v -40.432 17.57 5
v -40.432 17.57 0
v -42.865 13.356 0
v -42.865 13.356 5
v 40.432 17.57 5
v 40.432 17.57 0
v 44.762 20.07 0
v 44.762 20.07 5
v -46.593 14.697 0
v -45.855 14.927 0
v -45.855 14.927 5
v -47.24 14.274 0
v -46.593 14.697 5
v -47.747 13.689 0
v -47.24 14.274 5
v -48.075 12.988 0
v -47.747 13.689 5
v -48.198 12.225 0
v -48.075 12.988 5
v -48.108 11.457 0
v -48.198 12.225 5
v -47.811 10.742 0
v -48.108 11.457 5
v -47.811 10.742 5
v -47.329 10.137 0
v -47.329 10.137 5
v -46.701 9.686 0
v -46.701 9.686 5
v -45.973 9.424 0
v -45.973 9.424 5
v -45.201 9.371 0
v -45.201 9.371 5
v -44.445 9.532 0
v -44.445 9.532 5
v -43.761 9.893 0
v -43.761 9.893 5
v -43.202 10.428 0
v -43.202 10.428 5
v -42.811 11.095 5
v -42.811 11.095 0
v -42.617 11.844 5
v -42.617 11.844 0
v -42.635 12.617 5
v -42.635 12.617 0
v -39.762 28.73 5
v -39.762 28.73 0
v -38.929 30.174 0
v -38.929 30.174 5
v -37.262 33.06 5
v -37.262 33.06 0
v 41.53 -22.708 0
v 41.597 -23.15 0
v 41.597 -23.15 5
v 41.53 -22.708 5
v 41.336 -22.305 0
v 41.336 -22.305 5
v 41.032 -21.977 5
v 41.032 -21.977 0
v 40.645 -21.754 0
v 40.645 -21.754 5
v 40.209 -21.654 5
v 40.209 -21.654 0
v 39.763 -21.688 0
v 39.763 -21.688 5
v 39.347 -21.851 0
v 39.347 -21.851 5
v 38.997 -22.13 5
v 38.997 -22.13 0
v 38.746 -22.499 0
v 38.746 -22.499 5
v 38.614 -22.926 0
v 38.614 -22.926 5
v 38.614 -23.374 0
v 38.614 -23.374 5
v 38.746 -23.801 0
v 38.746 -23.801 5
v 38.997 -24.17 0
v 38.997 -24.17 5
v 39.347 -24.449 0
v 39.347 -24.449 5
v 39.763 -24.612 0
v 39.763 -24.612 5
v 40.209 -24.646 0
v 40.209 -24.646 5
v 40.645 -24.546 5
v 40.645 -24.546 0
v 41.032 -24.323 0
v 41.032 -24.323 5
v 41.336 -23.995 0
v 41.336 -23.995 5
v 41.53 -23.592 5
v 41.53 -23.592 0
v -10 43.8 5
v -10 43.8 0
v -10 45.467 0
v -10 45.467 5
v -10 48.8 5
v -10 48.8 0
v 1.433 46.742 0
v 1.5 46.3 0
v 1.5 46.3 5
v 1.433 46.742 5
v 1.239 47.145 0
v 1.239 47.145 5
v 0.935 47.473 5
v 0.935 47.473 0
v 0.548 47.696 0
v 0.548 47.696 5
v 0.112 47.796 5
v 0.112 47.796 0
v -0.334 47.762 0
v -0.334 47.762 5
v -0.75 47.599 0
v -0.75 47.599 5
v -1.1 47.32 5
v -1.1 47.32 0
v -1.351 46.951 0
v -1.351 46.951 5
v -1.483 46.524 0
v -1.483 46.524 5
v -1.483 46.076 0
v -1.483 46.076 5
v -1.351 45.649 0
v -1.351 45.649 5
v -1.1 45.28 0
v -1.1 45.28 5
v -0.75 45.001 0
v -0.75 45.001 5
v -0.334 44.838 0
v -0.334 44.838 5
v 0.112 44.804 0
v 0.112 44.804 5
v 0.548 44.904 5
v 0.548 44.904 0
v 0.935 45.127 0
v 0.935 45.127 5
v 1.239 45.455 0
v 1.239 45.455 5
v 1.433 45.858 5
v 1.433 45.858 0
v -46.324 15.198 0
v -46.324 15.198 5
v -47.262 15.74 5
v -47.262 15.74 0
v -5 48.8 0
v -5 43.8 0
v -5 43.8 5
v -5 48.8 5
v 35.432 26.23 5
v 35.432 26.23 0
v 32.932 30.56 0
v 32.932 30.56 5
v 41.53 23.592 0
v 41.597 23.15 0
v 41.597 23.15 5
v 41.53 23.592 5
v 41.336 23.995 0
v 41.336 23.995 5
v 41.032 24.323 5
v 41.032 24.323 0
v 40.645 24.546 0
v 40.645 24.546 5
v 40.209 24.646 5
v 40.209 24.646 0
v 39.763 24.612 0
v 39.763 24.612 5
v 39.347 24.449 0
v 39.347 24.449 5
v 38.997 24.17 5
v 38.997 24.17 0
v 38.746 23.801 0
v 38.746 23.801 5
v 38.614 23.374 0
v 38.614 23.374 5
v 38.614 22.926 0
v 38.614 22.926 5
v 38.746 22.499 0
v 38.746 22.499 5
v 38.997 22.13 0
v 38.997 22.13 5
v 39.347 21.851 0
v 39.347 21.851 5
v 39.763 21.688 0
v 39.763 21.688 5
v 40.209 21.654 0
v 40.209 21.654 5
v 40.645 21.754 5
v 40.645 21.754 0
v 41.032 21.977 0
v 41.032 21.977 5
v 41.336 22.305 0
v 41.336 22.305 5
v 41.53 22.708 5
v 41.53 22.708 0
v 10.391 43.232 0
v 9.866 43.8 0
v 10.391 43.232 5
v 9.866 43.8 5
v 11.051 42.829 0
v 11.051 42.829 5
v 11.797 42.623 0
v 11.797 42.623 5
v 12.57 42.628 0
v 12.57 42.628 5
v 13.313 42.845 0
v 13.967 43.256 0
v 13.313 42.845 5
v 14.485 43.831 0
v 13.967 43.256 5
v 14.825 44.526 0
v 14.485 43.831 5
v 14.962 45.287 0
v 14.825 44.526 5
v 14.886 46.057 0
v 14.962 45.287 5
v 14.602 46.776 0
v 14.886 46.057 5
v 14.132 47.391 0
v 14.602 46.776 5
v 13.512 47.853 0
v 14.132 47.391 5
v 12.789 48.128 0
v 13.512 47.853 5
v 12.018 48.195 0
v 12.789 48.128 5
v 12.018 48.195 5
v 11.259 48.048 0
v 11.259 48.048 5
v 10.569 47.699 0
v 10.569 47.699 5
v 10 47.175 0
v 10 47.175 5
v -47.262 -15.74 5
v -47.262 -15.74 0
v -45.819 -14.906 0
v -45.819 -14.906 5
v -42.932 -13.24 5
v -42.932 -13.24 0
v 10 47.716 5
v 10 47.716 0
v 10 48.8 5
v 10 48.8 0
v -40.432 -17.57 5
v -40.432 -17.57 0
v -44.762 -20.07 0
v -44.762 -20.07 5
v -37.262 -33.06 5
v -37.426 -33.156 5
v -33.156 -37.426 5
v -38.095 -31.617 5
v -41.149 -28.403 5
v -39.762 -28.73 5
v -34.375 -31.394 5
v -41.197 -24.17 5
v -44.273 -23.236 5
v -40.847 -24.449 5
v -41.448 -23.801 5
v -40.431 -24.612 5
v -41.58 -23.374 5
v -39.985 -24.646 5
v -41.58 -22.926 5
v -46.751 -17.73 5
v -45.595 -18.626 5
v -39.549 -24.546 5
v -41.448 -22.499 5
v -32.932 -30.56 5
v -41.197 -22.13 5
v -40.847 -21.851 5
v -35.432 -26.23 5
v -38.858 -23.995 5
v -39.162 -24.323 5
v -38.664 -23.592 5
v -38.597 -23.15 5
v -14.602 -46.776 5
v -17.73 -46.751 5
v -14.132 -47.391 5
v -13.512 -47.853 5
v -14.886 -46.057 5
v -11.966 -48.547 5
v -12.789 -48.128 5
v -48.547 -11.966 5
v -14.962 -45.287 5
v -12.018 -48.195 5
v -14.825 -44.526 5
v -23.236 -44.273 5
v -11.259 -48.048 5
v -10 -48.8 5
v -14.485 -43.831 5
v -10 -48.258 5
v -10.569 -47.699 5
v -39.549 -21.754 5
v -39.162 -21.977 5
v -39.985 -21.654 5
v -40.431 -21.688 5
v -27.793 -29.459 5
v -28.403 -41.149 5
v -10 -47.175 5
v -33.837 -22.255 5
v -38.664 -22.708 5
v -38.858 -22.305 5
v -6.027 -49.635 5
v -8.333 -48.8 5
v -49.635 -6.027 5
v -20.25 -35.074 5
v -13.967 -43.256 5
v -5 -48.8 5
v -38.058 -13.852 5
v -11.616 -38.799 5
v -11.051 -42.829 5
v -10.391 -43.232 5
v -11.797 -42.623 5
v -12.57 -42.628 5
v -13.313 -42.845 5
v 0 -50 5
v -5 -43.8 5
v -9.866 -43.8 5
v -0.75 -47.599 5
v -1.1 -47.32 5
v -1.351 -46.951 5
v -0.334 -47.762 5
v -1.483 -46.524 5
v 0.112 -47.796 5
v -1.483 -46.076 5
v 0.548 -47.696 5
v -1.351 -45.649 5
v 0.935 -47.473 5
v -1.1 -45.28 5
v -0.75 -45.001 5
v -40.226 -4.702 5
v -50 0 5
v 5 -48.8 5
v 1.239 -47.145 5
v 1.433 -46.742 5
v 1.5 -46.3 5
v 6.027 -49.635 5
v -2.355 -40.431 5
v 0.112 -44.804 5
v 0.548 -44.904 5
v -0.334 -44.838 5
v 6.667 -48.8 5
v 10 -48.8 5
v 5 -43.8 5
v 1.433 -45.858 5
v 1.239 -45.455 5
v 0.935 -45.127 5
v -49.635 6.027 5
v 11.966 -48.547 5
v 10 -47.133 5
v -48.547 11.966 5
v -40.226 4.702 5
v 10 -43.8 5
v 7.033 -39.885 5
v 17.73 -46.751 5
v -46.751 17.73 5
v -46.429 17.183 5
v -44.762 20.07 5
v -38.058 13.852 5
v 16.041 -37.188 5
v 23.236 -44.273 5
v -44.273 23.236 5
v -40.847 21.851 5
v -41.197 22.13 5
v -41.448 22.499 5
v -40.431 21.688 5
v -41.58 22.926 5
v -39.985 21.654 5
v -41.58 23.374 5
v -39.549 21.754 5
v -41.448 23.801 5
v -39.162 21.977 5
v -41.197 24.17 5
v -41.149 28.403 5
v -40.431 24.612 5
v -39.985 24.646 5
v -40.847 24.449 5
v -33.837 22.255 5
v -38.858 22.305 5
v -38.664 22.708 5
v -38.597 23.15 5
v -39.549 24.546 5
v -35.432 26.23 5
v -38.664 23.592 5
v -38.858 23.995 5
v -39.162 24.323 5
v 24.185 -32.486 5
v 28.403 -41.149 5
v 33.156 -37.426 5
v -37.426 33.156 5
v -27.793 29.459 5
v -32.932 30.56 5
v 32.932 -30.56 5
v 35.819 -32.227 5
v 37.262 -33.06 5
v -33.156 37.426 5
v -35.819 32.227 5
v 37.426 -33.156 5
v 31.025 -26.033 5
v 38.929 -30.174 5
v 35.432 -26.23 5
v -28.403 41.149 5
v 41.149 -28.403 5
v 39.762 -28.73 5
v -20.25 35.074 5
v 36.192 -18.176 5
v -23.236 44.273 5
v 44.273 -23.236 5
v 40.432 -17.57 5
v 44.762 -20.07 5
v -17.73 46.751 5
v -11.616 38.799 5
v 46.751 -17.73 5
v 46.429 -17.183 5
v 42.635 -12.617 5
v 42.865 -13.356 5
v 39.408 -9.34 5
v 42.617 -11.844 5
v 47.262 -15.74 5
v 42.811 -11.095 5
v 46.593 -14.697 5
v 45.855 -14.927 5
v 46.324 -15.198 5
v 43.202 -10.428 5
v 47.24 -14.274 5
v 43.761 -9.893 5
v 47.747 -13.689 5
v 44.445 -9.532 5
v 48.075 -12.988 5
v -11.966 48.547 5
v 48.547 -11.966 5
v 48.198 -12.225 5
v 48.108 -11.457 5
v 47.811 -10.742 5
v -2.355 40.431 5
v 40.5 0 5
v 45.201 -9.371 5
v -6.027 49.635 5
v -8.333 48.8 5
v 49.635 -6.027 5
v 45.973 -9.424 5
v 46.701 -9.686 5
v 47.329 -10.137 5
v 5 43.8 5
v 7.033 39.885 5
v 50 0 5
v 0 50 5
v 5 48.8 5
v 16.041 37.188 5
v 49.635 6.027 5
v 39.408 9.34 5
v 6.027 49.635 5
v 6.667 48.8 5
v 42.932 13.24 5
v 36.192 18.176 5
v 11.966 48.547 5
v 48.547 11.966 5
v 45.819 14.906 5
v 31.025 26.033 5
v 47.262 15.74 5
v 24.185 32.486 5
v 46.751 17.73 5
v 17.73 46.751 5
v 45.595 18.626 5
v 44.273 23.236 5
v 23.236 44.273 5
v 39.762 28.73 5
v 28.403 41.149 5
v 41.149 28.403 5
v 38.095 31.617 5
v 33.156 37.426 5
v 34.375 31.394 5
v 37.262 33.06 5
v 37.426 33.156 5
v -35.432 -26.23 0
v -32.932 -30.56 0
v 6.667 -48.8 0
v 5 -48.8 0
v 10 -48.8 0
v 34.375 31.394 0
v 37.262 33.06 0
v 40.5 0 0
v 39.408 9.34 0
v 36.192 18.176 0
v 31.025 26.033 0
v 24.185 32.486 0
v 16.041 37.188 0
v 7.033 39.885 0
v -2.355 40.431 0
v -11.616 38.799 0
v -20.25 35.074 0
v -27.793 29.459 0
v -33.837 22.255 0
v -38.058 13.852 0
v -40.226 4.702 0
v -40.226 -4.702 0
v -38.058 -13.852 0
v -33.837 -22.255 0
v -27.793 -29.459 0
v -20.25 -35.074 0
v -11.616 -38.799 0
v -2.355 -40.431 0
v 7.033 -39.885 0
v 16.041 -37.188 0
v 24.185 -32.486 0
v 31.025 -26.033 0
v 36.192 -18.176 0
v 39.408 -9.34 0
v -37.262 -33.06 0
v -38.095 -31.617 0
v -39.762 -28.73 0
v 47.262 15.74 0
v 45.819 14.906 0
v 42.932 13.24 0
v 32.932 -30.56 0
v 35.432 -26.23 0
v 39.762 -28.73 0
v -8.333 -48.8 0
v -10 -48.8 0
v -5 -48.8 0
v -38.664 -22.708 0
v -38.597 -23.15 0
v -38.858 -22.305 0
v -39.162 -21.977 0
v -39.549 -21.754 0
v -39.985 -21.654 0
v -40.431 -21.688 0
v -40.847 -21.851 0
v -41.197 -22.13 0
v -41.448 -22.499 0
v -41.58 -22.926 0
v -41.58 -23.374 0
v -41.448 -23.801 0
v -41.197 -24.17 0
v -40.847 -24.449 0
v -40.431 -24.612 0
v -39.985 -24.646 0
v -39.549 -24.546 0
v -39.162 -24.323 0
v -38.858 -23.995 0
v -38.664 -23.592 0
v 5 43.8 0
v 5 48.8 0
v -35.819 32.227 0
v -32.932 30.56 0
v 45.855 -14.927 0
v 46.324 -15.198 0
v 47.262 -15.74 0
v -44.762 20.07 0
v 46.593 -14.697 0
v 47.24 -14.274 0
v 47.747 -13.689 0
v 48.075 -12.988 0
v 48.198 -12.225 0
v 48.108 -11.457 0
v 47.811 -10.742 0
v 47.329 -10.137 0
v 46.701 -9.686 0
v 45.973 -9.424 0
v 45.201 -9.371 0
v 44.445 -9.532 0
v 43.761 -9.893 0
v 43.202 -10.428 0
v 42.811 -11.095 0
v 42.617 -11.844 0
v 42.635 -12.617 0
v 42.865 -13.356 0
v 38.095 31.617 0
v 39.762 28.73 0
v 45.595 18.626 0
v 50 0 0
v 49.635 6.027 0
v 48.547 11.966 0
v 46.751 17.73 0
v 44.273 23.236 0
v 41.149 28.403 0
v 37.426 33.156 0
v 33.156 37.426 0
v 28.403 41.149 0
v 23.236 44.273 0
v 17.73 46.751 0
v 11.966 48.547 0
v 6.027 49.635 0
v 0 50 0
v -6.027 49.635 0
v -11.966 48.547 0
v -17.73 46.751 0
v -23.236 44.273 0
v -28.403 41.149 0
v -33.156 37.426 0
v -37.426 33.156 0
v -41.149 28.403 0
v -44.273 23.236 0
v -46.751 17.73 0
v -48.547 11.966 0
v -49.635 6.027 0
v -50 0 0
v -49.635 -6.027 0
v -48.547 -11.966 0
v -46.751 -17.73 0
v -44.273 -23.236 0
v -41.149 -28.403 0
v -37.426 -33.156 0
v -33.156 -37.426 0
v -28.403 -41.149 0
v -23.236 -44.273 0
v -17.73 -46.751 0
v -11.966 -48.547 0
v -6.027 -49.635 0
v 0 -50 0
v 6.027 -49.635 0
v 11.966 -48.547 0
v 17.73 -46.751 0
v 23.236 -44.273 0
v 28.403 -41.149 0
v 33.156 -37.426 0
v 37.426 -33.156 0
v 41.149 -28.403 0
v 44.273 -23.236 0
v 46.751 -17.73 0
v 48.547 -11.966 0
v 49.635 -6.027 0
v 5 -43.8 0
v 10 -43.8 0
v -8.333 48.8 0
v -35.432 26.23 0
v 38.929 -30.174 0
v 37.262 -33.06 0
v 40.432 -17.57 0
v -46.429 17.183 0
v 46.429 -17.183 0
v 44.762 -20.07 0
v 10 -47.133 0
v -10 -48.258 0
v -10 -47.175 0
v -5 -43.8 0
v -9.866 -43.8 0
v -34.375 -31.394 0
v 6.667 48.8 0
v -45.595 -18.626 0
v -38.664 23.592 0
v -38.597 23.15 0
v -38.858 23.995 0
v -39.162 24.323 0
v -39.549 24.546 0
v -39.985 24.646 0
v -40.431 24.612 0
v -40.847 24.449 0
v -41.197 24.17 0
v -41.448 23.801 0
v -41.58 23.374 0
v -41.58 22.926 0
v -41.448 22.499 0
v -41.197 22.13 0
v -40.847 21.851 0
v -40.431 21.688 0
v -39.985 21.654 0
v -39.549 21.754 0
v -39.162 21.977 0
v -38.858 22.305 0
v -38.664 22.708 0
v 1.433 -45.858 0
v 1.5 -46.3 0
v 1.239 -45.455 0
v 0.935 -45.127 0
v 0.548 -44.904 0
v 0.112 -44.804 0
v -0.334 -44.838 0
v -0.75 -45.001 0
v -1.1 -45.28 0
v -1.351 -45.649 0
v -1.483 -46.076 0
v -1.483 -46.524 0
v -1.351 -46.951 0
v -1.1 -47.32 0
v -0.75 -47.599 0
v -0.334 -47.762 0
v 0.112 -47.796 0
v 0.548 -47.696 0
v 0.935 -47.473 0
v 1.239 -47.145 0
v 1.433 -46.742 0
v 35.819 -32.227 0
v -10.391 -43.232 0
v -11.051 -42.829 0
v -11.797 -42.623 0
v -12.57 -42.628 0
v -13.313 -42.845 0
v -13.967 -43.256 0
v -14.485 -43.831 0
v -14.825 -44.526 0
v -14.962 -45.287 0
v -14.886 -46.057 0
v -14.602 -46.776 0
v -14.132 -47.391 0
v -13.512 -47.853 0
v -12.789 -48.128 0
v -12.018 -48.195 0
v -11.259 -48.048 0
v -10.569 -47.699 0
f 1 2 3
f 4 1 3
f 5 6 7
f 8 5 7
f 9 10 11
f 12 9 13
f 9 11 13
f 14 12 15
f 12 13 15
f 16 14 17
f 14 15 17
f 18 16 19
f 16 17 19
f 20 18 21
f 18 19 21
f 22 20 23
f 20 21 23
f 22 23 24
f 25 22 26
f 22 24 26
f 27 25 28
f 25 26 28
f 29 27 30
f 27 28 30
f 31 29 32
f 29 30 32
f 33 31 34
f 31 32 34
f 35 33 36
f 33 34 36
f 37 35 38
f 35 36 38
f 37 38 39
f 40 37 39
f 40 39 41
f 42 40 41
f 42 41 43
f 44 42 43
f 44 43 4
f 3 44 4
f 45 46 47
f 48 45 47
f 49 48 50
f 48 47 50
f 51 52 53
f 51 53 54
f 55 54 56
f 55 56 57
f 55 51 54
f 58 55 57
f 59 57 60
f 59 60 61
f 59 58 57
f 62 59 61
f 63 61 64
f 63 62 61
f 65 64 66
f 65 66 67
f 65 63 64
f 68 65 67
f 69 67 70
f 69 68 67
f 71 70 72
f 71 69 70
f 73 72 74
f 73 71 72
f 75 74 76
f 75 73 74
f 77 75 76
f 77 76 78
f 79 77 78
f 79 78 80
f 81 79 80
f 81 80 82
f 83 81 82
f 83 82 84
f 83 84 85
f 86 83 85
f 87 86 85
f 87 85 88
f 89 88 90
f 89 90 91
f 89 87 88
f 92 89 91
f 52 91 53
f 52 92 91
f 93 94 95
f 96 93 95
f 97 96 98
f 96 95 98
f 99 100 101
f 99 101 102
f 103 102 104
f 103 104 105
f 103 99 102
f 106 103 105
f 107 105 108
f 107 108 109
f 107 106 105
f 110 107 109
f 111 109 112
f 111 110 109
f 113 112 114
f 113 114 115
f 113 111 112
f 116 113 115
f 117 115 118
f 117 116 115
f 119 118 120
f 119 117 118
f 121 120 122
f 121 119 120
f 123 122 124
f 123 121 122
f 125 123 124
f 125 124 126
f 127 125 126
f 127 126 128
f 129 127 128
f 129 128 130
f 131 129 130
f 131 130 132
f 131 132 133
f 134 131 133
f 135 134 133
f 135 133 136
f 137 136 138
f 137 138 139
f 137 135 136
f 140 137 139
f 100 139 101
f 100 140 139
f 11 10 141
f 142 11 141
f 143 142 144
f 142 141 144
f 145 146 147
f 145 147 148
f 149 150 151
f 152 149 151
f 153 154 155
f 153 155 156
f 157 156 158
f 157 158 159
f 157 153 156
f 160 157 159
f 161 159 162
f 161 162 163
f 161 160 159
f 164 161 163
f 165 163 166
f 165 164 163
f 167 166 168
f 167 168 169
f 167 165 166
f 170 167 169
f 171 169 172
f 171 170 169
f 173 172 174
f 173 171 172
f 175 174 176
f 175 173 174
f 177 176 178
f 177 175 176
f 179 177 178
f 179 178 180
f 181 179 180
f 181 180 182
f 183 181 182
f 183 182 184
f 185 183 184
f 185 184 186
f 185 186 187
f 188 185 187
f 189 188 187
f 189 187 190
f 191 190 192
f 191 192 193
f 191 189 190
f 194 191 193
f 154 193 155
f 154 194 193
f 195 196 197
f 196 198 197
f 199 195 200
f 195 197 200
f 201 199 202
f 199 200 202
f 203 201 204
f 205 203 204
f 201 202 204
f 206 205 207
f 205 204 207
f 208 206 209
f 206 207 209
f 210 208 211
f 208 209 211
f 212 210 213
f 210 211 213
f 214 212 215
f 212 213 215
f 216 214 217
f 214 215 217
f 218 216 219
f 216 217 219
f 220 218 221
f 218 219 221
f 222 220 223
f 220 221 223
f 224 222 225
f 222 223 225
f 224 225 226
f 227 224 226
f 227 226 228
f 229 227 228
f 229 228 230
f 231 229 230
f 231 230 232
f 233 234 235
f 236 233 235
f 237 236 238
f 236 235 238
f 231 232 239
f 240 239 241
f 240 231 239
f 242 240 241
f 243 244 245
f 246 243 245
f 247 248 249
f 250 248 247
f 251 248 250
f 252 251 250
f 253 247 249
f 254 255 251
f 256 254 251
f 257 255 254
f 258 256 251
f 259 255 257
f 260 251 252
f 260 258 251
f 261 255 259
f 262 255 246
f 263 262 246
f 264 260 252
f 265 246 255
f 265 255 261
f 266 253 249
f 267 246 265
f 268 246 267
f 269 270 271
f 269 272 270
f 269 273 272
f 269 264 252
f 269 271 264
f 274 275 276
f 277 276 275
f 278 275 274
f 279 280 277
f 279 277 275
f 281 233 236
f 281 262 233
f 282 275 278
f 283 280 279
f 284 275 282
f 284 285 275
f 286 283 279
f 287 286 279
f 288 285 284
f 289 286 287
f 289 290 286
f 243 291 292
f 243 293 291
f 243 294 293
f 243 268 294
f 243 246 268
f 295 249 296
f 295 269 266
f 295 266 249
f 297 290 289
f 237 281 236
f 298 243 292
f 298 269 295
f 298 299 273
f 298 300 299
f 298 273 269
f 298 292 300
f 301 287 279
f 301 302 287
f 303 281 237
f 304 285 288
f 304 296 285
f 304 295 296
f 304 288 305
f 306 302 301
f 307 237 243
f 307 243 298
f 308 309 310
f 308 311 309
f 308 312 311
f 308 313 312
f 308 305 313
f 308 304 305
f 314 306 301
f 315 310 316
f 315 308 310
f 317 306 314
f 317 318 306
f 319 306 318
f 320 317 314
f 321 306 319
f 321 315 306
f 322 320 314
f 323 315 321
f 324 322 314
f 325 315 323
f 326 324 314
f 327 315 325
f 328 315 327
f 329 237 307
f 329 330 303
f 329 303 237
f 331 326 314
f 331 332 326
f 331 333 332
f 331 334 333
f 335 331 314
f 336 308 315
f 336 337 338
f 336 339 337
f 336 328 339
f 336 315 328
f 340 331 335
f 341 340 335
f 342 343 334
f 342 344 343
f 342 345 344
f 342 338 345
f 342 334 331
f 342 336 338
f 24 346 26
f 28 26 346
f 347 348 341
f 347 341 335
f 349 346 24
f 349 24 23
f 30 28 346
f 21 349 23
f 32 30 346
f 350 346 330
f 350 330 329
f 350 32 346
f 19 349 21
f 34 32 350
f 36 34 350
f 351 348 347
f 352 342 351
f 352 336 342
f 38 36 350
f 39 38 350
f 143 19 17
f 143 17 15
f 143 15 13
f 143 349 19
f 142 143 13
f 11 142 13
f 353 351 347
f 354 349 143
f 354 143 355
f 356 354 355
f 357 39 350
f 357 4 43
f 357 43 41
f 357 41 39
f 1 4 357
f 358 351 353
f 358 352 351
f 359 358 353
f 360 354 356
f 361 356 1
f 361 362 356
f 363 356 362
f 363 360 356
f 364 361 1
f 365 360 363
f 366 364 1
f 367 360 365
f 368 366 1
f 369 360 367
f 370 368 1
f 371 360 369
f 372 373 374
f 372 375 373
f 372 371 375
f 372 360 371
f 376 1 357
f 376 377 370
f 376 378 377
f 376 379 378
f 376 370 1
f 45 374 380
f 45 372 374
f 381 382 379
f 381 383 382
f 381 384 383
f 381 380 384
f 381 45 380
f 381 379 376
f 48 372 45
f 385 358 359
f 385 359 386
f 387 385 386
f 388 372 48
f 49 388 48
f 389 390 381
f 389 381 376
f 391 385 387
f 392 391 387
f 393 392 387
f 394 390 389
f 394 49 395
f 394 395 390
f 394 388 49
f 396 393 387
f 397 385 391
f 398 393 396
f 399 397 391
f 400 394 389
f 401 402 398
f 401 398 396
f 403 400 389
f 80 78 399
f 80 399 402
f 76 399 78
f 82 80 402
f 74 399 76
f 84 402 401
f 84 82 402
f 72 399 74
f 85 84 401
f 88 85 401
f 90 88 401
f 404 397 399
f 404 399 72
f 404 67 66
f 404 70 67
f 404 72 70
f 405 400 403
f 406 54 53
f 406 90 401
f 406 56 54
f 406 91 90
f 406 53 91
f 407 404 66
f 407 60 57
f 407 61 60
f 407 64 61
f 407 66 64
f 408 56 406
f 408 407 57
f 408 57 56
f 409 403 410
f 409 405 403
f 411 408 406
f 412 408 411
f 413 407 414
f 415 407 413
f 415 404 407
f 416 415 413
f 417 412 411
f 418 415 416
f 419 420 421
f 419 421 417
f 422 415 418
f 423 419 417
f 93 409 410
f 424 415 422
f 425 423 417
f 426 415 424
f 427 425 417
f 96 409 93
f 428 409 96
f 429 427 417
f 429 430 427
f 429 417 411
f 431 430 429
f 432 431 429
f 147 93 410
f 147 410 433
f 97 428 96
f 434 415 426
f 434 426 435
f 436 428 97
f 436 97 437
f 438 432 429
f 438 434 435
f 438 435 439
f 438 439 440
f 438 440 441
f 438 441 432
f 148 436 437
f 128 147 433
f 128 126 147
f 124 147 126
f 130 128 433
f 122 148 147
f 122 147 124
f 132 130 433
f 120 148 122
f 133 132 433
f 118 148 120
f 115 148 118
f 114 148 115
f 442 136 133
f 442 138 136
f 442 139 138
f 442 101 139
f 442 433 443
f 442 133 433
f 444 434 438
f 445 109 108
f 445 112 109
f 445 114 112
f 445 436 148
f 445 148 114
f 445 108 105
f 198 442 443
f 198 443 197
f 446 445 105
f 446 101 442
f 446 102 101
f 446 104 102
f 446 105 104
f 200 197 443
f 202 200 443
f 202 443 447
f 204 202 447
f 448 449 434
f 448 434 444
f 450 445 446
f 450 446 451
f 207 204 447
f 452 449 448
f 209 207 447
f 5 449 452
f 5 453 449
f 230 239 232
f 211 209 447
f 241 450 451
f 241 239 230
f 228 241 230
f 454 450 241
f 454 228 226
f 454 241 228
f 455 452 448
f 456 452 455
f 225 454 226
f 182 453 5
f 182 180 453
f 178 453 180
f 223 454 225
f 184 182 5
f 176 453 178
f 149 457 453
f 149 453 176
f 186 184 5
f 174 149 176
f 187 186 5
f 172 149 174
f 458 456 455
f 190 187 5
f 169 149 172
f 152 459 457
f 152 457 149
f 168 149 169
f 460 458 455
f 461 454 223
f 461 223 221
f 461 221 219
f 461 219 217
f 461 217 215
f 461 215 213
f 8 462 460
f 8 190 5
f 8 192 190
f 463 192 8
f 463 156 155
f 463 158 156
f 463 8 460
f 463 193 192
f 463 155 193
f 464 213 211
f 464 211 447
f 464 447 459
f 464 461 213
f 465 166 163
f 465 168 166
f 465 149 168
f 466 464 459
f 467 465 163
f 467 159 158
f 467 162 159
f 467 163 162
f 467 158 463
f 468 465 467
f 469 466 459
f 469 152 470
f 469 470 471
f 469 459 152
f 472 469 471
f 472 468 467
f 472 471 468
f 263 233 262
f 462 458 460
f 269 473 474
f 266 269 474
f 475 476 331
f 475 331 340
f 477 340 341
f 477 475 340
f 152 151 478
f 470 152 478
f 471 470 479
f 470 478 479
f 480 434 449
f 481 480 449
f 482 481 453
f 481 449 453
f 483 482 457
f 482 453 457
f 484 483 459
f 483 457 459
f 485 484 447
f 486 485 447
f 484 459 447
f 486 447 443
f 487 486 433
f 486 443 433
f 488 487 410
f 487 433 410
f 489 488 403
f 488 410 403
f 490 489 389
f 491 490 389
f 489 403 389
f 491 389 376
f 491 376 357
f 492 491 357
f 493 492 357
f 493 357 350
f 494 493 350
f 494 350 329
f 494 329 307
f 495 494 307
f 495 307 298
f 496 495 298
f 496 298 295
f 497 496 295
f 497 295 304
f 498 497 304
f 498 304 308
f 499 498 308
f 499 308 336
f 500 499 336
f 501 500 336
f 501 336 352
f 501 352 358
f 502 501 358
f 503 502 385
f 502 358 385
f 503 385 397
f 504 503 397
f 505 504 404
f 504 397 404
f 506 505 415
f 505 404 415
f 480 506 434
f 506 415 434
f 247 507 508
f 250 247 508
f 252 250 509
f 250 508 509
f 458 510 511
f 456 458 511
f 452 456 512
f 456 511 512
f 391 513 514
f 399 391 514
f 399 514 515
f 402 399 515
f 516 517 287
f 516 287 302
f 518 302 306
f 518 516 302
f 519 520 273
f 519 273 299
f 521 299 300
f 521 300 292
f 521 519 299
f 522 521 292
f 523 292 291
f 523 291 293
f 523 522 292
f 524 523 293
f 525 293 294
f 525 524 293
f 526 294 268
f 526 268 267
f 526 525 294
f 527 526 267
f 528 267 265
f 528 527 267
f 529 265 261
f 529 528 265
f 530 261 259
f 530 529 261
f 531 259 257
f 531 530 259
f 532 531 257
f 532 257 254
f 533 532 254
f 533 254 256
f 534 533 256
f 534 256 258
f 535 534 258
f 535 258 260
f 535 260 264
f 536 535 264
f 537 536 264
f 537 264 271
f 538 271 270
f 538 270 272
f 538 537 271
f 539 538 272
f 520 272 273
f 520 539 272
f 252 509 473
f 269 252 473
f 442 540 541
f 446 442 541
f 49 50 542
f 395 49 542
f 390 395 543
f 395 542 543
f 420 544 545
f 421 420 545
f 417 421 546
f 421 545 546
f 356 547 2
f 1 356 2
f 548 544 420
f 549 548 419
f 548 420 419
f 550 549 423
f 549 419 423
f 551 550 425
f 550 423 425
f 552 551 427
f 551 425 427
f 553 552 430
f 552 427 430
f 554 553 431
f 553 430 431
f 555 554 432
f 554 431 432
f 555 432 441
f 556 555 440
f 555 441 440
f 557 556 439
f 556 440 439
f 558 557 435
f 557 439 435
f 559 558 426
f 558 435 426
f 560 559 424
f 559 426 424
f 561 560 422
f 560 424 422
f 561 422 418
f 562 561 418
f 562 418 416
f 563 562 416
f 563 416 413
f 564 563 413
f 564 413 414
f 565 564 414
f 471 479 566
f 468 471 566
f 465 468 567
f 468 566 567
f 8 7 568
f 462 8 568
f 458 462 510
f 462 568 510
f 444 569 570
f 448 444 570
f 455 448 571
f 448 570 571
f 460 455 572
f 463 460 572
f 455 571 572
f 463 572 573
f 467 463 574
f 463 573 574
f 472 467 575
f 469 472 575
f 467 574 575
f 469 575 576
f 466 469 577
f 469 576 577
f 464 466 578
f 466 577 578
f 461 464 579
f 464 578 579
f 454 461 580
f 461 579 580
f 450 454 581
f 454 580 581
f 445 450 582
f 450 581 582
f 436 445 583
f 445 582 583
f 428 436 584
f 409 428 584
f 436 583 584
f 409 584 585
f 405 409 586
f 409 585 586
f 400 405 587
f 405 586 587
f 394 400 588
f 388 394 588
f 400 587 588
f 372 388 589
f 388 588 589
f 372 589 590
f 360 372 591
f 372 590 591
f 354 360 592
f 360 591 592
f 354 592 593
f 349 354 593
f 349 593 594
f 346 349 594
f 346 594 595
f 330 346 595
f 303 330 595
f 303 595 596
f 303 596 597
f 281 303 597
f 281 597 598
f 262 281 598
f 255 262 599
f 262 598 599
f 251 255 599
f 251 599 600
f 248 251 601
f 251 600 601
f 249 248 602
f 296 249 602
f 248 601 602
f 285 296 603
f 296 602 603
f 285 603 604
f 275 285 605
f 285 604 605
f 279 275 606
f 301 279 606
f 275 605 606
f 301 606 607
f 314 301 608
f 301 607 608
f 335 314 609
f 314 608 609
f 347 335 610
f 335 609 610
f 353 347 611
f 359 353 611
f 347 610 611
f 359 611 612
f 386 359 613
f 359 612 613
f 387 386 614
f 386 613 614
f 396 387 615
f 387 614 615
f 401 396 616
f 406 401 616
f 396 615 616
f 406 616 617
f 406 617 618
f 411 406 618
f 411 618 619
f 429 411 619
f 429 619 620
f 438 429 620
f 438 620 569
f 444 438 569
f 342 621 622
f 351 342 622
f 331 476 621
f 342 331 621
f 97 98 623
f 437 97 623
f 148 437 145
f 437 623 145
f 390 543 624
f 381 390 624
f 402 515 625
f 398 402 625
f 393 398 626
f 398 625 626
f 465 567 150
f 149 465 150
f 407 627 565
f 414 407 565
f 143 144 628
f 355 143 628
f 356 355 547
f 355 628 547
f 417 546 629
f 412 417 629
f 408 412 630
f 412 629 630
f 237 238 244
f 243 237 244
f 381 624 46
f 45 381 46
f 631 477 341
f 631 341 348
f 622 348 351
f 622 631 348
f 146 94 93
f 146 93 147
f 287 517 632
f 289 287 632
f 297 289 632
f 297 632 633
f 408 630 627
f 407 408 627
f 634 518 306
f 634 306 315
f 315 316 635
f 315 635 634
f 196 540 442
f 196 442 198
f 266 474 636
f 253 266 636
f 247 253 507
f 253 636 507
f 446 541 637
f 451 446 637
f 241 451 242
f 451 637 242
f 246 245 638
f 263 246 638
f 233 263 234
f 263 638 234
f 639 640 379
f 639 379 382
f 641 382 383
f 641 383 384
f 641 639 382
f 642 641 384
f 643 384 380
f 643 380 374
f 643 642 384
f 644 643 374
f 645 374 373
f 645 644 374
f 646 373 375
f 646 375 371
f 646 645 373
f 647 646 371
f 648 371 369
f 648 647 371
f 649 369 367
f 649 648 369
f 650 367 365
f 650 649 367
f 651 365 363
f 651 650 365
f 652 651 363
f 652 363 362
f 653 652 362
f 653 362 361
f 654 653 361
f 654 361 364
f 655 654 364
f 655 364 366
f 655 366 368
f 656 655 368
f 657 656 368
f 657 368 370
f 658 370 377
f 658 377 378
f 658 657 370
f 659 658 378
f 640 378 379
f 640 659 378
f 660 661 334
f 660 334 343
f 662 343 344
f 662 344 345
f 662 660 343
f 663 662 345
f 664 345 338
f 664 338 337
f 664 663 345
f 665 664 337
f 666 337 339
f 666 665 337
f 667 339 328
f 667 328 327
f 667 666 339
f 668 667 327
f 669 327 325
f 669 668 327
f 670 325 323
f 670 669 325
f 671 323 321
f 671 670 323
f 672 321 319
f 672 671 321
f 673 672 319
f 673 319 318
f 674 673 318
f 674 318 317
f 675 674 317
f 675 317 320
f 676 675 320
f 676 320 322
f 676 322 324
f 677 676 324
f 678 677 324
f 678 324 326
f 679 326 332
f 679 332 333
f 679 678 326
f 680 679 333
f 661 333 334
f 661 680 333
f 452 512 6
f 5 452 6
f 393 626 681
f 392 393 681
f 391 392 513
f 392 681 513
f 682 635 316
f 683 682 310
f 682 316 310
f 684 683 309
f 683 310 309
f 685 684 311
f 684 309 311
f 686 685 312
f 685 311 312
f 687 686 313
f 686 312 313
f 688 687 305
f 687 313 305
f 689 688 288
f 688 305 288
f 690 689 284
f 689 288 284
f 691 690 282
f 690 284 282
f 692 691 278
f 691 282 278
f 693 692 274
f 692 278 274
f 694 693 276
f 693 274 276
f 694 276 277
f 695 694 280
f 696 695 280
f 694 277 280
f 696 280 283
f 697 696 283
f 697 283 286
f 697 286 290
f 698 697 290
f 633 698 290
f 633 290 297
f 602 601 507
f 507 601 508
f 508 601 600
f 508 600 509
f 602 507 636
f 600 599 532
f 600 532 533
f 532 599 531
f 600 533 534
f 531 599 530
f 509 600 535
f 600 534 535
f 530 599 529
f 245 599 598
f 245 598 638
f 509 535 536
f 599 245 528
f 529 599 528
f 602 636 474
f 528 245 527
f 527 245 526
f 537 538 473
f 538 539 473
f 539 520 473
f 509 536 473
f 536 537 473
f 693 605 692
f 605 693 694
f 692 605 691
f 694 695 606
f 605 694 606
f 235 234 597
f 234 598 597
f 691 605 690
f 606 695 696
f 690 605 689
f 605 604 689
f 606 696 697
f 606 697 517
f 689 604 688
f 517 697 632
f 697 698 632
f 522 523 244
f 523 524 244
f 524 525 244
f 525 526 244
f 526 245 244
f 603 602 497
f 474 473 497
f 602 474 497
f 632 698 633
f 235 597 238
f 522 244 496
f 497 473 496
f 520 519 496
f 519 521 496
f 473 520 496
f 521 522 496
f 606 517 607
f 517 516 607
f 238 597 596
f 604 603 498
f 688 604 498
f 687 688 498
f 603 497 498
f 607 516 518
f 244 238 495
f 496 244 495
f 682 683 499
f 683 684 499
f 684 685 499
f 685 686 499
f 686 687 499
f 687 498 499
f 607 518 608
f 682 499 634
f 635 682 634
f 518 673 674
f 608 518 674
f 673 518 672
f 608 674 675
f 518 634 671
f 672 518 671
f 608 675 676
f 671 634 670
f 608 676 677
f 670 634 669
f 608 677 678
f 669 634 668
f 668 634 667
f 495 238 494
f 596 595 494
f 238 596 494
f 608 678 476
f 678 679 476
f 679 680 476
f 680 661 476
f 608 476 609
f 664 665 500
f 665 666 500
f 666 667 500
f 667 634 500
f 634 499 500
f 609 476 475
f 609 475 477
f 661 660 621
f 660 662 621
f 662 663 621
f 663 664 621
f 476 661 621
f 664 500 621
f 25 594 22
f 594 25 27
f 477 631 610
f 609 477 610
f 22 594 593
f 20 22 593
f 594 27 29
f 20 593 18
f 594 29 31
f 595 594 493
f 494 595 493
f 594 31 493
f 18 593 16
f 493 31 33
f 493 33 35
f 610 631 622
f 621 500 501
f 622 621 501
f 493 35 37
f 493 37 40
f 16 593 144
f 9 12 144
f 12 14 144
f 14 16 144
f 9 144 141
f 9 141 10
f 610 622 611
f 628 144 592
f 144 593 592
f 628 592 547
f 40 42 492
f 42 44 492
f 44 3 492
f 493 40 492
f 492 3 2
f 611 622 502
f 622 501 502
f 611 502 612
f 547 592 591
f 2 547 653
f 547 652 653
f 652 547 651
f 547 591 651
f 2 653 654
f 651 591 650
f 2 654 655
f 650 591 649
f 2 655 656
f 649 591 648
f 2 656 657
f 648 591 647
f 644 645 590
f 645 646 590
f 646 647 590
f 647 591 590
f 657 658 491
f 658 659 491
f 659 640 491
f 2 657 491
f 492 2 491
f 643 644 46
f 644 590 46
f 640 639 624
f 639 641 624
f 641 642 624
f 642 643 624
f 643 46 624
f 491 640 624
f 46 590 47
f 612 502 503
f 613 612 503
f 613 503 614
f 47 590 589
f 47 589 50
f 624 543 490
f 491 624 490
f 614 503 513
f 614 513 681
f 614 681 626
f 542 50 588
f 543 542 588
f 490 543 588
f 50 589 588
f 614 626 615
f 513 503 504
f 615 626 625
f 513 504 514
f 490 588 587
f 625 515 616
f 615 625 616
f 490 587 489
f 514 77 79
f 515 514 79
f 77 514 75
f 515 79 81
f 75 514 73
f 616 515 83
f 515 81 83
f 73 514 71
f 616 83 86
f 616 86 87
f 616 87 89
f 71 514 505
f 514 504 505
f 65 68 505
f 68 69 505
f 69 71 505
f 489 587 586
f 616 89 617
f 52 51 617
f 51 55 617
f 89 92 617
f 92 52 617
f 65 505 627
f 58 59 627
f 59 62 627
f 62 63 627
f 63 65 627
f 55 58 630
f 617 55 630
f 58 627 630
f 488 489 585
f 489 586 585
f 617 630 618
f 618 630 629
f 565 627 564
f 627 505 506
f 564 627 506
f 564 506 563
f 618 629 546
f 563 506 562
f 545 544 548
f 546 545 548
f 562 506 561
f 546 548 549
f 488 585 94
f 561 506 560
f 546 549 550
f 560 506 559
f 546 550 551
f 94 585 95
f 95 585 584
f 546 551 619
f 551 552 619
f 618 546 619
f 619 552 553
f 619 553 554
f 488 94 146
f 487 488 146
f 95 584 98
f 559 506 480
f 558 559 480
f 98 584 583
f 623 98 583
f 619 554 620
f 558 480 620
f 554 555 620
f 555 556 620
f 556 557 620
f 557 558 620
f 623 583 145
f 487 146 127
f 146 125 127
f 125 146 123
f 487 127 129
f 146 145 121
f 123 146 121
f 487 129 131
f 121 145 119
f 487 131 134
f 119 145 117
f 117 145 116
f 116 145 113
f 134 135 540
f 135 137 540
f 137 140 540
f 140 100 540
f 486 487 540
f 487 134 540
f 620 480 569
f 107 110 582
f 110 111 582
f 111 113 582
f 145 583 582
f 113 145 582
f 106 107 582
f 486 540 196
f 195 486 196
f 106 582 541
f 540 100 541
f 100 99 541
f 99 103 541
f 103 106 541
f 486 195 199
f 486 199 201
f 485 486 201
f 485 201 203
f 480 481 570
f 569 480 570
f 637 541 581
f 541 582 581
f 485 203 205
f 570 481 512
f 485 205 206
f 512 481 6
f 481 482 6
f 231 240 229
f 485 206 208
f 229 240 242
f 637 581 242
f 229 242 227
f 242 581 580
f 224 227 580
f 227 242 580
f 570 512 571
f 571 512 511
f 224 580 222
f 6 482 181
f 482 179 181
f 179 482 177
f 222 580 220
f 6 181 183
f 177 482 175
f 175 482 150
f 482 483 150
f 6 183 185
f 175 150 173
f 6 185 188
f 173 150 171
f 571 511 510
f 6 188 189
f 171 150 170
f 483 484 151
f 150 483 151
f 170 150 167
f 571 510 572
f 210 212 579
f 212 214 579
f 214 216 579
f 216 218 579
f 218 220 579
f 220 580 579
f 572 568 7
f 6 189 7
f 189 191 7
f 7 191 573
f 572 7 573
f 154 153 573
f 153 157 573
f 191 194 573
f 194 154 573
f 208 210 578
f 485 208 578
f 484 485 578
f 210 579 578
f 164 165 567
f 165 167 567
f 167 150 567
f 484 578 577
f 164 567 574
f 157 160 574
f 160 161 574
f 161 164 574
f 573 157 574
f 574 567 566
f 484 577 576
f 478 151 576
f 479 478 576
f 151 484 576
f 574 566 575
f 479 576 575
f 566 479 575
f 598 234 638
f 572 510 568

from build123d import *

# Parameters (mm, degrees)
BOSS_EXTRU_1_OUTLINE_R   = 50
BOSS_EXTRU_1_OUTLINE_W   = 5
BOSS_EXTRU_1_OUTLINE_H   = 5
BOSS_EXTRU_1_OUTLINE_R_2 = 1.5
BOSS_EXTRU_1_DEPTH       = 5
SKETCH4_R                = 2.8
CUT_EXTRUDE4_DEPTH       = 10
SKETCH5_R                = 40.5
CUT_EXTRUDE5_DEPTH       = 10


# Read off the part's stored shape, not the designer's step: Boss.-Extru.1
with BuildPart() as part:
    # Boss.-Extru.1 outline → Boss.-Extru.1 (new body)
    with BuildSketch(Plane.XY):
        Circle(BOSS_EXTRU_1_OUTLINE_R)
        Polygon((-37.262039705, -33.060254038), (-39.762039705, -28.730127019), (-35.431912686, -26.230127019), (-32.931912686, -30.560254038), align=None, mode=Mode.SUBTRACT)
        with Locations((-7.5, -46.3)):
            Rectangle(BOSS_EXTRU_1_OUTLINE_W, BOSS_EXTRU_1_OUTLINE_H, mode=Mode.SUBTRACT)
        with Locations((-40.096976195, -23.15)):
            Circle(BOSS_EXTRU_1_OUTLINE_R_2, mode=Mode.SUBTRACT)
        Polygon((-42.931912686, -13.239745962), (-40.431912686, -17.569872981), (-44.762039705, -20.069872981), (-47.262039705, -15.739745962), align=None, mode=Mode.SUBTRACT)
        with Locations((0, -46.3)):
            Circle(BOSS_EXTRU_1_OUTLINE_R_2, mode=Mode.SUBTRACT)
        with Locations((7.5, -46.3)):
            Rectangle(BOSS_EXTRU_1_OUTLINE_W, BOSS_EXTRU_1_OUTLINE_H, mode=Mode.SUBTRACT)
        Polygon((32.931912686, -30.560254038), (35.431912686, -26.230127019), (39.762039705, -28.730127019), (37.262039705, -33.060254038), align=None, mode=Mode.SUBTRACT)
        with Locations((40.096976195, -23.15)):
            Circle(BOSS_EXTRU_1_OUTLINE_R_2, mode=Mode.SUBTRACT)
        Polygon((47.262039705, -15.739745962), (44.762039705, -20.069872981), (40.431912686, -17.569872981), (42.931912686, -13.239745962), align=None, mode=Mode.SUBTRACT)
        Polygon((-47.262039705, 15.739745962), (-44.762039705, 20.069872981), (-40.431912686, 17.569872981), (-42.931912686, 13.239745962), align=None, mode=Mode.SUBTRACT)
        with Locations((-40.096976195, 23.15)):
            Circle(BOSS_EXTRU_1_OUTLINE_R_2, mode=Mode.SUBTRACT)
        Polygon((-32.931912686, 30.560254038), (-35.431912686, 26.230127019), (-39.762039705, 28.730127019), (-37.262039705, 33.060254038), align=None, mode=Mode.SUBTRACT)
        with Locations((-7.5, 46.3)):
            Rectangle(BOSS_EXTRU_1_OUTLINE_W, BOSS_EXTRU_1_OUTLINE_H, mode=Mode.SUBTRACT)
        Polygon((42.931912686, 13.239745962), (40.431912686, 17.569872981), (44.762039705, 20.069872981), (47.262039705, 15.739745962), align=None, mode=Mode.SUBTRACT)
        with Locations((40.096976195, 23.15)):
            Circle(BOSS_EXTRU_1_OUTLINE_R_2, mode=Mode.SUBTRACT)
        with Locations((0, 46.3)):
            Circle(BOSS_EXTRU_1_OUTLINE_R_2, mode=Mode.SUBTRACT)
        with Locations((7.5, 46.3)):
            Rectangle(BOSS_EXTRU_1_OUTLINE_W, BOSS_EXTRU_1_OUTLINE_H, mode=Mode.SUBTRACT)
        Polygon((37.262039705, 33.060254038), (39.762039705, 28.730127019), (35.431912686, 26.230127019), (32.931912686, 30.560254038), align=None, mode=Mode.SUBTRACT)
    extrude(amount=BOSS_EXTRU_1_DEPTH)

    # Sketch4 → Cut-Extrude4 (cut)
    with BuildSketch(Plane.XY.offset(5)):
        with Locations((-12.16449512, -45.398513836)):
            Circle(SKETCH4_R)
        with Locations((-45.398513836, 12.16449512)):
            Circle(SKETCH4_R)
        with Locations((12.16449512, 45.398513836)):
            Circle(SKETCH4_R)
        with Locations((45.398513836, -12.16449512)):
            Circle(SKETCH4_R)
    extrude(amount=-CUT_EXTRUDE4_DEPTH, mode=Mode.SUBTRACT)

    # Sketch5 → Cut-Extrude5 (cut)
    with BuildSketch(Plane.XY.offset(5)):
        Circle(SKETCH5_R)
    extrude(amount=-CUT_EXTRUDE5_DEPTH, mode=Mode.SUBTRACT)


solid = part.part
